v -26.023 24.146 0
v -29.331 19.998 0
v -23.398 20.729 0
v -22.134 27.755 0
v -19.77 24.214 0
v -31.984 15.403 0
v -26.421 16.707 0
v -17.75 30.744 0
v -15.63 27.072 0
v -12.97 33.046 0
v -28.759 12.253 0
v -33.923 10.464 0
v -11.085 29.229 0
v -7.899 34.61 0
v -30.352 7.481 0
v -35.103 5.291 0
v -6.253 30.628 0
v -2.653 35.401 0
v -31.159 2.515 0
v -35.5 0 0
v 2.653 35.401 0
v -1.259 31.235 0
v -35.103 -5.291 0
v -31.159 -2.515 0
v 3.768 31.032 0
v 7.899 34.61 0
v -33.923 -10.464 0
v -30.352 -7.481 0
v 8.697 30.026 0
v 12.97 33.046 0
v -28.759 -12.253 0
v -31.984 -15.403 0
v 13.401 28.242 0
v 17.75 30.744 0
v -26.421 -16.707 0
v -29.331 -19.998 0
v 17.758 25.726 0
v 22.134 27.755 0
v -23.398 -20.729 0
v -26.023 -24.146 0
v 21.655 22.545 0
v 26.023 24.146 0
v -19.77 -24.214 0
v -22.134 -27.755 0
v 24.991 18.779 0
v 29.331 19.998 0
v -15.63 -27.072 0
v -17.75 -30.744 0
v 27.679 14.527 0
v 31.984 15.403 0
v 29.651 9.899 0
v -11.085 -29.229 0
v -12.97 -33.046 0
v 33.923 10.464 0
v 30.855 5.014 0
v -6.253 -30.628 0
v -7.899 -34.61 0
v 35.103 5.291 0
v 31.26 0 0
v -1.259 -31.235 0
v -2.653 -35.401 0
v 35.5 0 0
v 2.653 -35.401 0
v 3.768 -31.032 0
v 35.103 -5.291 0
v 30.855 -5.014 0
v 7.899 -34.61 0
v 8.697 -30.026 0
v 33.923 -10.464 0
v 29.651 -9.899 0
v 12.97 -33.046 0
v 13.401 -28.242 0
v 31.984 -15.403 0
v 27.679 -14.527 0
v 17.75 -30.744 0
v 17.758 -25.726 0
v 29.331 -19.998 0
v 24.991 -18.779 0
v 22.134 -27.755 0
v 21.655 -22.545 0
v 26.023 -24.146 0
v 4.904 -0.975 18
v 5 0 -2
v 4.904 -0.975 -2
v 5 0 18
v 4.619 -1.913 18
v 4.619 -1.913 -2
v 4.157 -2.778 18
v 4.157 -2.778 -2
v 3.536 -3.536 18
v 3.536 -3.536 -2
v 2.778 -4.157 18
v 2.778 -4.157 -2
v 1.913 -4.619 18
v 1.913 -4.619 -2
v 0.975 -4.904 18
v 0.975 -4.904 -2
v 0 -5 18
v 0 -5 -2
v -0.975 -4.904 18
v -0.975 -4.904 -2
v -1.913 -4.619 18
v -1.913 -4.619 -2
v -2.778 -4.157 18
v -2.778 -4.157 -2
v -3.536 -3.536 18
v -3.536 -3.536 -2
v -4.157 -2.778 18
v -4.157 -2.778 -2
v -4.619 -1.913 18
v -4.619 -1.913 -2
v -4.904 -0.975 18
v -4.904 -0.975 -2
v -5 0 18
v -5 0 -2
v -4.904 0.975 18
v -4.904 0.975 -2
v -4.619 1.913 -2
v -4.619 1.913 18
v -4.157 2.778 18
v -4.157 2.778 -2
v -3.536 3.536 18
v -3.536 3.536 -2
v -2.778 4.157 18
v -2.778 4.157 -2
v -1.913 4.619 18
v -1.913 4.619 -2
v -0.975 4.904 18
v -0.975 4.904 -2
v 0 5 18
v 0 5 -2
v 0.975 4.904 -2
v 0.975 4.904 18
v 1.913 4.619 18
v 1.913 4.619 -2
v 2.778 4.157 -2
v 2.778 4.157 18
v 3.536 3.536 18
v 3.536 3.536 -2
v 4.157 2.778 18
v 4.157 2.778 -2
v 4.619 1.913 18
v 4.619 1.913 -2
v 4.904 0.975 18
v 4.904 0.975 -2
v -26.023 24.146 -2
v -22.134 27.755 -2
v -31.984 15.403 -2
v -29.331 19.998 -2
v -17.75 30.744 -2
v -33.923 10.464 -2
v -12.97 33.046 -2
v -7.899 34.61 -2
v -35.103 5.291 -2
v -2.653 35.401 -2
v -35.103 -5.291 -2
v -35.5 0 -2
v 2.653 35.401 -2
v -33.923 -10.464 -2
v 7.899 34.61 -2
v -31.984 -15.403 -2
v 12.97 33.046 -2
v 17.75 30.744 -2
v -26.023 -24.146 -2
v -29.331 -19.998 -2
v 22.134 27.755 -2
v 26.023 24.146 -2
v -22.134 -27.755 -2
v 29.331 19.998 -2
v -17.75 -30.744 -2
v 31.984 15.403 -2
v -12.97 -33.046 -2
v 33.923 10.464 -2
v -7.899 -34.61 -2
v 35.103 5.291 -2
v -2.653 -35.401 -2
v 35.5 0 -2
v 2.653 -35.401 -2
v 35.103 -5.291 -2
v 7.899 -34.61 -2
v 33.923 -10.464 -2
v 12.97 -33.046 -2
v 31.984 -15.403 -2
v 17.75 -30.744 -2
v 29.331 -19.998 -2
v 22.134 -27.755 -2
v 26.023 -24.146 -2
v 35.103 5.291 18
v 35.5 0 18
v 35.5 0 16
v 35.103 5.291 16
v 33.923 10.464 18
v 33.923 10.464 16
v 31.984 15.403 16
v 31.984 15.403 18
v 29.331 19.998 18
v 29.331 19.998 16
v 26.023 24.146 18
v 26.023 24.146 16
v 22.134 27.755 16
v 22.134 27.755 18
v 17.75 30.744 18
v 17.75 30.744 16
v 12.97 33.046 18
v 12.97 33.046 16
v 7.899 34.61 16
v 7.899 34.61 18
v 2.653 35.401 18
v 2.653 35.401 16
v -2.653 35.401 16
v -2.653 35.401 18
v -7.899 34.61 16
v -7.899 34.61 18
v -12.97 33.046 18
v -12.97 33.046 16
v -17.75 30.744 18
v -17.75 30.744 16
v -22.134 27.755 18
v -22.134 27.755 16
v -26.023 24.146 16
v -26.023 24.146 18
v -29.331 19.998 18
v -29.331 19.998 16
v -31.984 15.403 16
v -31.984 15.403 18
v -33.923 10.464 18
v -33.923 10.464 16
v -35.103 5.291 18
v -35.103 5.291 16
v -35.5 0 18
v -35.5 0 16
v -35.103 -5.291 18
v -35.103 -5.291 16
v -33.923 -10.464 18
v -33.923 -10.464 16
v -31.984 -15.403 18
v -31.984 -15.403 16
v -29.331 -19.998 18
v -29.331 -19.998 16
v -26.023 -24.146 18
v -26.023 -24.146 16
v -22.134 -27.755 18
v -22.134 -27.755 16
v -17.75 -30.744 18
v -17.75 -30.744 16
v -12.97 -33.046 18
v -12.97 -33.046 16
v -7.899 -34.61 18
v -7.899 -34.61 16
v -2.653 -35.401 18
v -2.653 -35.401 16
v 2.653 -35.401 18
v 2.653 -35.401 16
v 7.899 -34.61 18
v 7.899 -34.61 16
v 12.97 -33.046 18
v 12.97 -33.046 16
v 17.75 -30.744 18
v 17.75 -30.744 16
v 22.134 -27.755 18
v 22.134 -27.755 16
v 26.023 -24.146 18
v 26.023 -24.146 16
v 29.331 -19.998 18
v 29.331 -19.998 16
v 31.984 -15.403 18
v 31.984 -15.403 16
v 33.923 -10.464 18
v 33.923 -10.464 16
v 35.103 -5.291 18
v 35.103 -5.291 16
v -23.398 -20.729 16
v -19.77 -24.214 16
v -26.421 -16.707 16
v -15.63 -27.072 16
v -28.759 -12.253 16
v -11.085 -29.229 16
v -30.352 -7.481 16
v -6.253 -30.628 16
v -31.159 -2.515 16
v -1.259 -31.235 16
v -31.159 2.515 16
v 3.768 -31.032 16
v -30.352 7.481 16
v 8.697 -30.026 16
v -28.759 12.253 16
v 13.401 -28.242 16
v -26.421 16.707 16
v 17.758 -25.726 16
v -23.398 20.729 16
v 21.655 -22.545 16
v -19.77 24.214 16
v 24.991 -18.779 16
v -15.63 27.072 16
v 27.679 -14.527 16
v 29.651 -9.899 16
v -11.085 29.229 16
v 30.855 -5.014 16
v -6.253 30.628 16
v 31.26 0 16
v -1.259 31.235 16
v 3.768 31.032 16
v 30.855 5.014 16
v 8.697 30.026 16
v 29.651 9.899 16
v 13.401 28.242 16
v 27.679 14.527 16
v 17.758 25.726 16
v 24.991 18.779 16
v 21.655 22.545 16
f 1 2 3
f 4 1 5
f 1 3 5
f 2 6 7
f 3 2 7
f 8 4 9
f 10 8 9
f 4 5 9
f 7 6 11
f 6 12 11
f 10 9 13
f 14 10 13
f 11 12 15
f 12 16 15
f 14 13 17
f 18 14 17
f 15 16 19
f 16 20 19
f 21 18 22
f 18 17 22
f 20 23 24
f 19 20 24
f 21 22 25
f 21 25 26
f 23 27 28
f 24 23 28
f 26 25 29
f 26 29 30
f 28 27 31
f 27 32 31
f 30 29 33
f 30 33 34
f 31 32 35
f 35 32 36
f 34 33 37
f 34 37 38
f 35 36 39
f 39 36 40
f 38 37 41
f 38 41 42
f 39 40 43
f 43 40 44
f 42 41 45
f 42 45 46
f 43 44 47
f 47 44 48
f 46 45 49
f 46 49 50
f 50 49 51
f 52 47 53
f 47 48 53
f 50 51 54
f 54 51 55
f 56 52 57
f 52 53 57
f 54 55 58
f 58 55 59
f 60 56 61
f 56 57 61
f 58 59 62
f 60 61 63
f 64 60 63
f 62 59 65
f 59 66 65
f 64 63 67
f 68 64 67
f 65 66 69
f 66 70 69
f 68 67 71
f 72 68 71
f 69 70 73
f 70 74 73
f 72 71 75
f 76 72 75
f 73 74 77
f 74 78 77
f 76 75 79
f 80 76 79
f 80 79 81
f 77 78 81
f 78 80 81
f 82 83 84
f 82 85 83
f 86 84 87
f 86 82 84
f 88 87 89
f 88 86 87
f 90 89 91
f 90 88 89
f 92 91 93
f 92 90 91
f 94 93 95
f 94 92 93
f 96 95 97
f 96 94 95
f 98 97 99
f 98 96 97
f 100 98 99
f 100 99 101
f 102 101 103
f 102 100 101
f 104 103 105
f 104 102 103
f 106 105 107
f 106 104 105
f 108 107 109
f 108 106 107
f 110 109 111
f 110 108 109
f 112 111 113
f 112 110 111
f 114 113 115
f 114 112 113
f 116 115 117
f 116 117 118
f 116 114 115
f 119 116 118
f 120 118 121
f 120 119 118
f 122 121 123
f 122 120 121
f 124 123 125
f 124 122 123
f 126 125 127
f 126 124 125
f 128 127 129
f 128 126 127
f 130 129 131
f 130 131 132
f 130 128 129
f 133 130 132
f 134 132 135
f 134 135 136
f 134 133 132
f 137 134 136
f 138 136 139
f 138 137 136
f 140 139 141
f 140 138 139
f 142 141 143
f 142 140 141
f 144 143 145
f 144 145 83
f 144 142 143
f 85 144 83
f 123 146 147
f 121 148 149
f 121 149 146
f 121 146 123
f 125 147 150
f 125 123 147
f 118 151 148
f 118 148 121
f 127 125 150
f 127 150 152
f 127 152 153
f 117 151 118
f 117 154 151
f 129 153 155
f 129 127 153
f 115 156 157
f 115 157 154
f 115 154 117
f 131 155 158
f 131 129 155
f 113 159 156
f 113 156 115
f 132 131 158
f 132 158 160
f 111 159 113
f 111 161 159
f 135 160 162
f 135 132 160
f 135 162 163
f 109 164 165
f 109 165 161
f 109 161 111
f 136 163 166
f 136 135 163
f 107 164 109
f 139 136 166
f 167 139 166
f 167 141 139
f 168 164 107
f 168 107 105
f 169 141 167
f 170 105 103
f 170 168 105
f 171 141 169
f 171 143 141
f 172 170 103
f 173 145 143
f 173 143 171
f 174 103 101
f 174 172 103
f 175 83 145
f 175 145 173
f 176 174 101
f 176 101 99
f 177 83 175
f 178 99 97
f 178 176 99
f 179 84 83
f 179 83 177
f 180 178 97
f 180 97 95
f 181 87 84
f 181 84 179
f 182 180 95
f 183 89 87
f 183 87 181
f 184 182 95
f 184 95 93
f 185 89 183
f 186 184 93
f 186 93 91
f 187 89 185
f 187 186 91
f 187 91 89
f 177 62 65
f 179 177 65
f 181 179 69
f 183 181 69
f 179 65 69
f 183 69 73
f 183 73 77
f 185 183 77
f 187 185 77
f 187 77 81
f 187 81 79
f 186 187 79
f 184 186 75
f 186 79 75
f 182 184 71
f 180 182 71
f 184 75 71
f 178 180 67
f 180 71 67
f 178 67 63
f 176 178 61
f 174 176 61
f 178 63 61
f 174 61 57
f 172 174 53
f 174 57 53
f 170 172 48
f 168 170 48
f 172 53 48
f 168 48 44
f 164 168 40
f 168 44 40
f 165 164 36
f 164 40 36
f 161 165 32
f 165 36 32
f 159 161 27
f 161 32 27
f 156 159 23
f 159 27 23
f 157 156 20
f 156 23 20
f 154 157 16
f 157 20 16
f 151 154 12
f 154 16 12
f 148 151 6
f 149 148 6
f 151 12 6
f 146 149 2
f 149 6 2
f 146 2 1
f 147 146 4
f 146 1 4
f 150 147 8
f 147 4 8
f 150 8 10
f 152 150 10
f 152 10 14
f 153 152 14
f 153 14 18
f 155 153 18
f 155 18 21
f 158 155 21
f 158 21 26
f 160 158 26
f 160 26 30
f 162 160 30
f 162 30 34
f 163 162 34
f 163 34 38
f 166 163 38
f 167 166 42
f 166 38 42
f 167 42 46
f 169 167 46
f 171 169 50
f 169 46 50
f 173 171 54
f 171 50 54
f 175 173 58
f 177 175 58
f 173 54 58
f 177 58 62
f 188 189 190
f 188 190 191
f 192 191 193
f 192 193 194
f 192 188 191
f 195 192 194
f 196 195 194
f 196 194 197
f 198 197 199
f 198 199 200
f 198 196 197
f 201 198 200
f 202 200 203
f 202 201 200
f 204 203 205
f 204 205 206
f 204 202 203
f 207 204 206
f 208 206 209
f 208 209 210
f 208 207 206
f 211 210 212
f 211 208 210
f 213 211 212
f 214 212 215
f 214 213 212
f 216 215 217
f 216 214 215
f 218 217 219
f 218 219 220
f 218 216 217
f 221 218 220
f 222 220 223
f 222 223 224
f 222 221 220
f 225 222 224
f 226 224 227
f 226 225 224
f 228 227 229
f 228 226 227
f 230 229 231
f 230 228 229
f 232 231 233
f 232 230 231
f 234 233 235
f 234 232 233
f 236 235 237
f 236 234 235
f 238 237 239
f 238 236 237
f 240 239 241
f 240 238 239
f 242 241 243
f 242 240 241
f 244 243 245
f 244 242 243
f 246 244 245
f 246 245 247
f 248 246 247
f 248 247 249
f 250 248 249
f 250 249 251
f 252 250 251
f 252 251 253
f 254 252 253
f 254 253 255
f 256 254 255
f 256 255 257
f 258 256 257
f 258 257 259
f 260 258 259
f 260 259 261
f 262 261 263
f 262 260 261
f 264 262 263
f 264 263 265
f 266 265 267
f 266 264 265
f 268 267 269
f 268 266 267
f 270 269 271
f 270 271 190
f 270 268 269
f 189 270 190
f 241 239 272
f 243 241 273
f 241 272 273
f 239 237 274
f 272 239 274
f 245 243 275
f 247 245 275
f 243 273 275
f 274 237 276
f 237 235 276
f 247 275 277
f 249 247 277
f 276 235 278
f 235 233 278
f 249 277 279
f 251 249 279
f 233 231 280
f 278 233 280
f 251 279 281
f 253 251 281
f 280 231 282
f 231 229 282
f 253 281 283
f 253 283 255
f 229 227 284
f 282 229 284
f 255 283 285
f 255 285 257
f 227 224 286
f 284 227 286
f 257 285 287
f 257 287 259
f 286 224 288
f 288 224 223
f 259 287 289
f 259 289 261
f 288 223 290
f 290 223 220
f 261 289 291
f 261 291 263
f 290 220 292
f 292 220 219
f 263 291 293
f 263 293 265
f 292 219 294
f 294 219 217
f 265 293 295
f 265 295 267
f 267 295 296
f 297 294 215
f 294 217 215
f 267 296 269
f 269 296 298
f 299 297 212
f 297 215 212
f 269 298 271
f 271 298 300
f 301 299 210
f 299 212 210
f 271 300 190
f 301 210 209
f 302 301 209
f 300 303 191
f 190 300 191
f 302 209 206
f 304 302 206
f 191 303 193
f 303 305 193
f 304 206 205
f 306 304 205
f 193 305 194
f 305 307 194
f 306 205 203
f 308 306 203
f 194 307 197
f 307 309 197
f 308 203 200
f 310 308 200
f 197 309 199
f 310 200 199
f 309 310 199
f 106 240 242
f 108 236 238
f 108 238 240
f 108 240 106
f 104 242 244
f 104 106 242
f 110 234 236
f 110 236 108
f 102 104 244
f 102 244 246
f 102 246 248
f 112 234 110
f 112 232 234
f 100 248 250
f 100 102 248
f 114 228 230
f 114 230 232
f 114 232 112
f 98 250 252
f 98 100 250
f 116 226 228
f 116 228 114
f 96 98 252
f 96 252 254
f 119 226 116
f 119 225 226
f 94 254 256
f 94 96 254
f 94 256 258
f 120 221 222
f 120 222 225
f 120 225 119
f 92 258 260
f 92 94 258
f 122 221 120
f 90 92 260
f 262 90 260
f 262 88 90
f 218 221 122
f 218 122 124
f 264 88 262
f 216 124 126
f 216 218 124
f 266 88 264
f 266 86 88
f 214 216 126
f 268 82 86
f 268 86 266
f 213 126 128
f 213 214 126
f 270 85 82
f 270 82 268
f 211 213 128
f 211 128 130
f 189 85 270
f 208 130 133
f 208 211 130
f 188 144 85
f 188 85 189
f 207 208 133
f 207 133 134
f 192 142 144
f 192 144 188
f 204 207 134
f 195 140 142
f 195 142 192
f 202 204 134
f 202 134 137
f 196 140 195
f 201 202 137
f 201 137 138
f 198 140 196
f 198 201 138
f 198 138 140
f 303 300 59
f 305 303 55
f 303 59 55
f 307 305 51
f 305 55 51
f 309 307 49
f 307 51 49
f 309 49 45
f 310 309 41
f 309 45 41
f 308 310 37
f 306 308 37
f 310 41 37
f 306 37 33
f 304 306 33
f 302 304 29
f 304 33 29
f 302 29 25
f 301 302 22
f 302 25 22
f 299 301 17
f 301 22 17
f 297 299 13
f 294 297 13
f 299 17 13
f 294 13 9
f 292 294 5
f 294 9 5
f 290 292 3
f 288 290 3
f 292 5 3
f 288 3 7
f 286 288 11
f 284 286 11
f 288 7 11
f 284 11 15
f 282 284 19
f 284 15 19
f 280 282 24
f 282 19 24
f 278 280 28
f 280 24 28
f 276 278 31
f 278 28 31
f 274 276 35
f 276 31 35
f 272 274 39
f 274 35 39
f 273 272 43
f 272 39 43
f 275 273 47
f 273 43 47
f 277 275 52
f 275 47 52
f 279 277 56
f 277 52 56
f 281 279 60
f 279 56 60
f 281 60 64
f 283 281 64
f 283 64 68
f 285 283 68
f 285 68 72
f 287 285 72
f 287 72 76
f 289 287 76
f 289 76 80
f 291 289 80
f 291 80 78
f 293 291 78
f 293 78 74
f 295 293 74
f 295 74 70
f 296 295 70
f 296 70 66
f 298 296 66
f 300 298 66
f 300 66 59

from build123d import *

# Parameters (mm, degrees)
SKETCH_1_R          = 31.26
EXTRUDE_1_DEPTH     = 16
SKETCH_2_R          = 5
CUT_EXTRUDE_1_DEPTH = 16
EXTRUDE_START       = 2
SKETCH_3_R          = 35.5
SKETCH_3_R_2        = 5
EXTRUDE_2_DEPTH     = 2
SKETCH_4_R          = 35.5
SKETCH_4_R_2        = 5
EXTRUDE_3_DEPTH     = 2


with BuildPart() as part:
    # 草图1 → 凸台-拉伸1 (new body)
    with BuildSketch(Plane.XY):
        Circle(SKETCH_1_R)
    extrude(amount=EXTRUDE_1_DEPTH)

    # 草图2 → 切除-拉伸1 (cut)
    with BuildSketch(Plane.XY.offset(16)):
        Circle(SKETCH_2_R)
    extrude(amount=-CUT_EXTRUDE_1_DEPTH, mode=Mode.SUBTRACT)

    # 草图3 → 凸台-拉伸2 (add)
    with BuildSketch(Plane.XY.offset(16).offset(EXTRUDE_START)):
        Circle(SKETCH_3_R)
        Circle(SKETCH_3_R_2, mode=Mode.SUBTRACT)
    extrude(amount=-EXTRUDE_2_DEPTH)

    # 草图4 → 凸台-拉伸3 (add)
    with BuildSketch(Plane(origin=(0, 0, 0), x_dir=(-1, 0, 0), z_dir=(0, 0, -1))):
        with Locations(Location((0, 0, 0), (0, 0, 180))):
            Circle(SKETCH_4_R)
        with Locations(Location((0, 0, 0), (0, 0, 180))):
            Circle(SKETCH_4_R_2, mode=Mode.SUBTRACT)
    extrude(amount=EXTRUDE_3_DEPTH)


solid = part.part
